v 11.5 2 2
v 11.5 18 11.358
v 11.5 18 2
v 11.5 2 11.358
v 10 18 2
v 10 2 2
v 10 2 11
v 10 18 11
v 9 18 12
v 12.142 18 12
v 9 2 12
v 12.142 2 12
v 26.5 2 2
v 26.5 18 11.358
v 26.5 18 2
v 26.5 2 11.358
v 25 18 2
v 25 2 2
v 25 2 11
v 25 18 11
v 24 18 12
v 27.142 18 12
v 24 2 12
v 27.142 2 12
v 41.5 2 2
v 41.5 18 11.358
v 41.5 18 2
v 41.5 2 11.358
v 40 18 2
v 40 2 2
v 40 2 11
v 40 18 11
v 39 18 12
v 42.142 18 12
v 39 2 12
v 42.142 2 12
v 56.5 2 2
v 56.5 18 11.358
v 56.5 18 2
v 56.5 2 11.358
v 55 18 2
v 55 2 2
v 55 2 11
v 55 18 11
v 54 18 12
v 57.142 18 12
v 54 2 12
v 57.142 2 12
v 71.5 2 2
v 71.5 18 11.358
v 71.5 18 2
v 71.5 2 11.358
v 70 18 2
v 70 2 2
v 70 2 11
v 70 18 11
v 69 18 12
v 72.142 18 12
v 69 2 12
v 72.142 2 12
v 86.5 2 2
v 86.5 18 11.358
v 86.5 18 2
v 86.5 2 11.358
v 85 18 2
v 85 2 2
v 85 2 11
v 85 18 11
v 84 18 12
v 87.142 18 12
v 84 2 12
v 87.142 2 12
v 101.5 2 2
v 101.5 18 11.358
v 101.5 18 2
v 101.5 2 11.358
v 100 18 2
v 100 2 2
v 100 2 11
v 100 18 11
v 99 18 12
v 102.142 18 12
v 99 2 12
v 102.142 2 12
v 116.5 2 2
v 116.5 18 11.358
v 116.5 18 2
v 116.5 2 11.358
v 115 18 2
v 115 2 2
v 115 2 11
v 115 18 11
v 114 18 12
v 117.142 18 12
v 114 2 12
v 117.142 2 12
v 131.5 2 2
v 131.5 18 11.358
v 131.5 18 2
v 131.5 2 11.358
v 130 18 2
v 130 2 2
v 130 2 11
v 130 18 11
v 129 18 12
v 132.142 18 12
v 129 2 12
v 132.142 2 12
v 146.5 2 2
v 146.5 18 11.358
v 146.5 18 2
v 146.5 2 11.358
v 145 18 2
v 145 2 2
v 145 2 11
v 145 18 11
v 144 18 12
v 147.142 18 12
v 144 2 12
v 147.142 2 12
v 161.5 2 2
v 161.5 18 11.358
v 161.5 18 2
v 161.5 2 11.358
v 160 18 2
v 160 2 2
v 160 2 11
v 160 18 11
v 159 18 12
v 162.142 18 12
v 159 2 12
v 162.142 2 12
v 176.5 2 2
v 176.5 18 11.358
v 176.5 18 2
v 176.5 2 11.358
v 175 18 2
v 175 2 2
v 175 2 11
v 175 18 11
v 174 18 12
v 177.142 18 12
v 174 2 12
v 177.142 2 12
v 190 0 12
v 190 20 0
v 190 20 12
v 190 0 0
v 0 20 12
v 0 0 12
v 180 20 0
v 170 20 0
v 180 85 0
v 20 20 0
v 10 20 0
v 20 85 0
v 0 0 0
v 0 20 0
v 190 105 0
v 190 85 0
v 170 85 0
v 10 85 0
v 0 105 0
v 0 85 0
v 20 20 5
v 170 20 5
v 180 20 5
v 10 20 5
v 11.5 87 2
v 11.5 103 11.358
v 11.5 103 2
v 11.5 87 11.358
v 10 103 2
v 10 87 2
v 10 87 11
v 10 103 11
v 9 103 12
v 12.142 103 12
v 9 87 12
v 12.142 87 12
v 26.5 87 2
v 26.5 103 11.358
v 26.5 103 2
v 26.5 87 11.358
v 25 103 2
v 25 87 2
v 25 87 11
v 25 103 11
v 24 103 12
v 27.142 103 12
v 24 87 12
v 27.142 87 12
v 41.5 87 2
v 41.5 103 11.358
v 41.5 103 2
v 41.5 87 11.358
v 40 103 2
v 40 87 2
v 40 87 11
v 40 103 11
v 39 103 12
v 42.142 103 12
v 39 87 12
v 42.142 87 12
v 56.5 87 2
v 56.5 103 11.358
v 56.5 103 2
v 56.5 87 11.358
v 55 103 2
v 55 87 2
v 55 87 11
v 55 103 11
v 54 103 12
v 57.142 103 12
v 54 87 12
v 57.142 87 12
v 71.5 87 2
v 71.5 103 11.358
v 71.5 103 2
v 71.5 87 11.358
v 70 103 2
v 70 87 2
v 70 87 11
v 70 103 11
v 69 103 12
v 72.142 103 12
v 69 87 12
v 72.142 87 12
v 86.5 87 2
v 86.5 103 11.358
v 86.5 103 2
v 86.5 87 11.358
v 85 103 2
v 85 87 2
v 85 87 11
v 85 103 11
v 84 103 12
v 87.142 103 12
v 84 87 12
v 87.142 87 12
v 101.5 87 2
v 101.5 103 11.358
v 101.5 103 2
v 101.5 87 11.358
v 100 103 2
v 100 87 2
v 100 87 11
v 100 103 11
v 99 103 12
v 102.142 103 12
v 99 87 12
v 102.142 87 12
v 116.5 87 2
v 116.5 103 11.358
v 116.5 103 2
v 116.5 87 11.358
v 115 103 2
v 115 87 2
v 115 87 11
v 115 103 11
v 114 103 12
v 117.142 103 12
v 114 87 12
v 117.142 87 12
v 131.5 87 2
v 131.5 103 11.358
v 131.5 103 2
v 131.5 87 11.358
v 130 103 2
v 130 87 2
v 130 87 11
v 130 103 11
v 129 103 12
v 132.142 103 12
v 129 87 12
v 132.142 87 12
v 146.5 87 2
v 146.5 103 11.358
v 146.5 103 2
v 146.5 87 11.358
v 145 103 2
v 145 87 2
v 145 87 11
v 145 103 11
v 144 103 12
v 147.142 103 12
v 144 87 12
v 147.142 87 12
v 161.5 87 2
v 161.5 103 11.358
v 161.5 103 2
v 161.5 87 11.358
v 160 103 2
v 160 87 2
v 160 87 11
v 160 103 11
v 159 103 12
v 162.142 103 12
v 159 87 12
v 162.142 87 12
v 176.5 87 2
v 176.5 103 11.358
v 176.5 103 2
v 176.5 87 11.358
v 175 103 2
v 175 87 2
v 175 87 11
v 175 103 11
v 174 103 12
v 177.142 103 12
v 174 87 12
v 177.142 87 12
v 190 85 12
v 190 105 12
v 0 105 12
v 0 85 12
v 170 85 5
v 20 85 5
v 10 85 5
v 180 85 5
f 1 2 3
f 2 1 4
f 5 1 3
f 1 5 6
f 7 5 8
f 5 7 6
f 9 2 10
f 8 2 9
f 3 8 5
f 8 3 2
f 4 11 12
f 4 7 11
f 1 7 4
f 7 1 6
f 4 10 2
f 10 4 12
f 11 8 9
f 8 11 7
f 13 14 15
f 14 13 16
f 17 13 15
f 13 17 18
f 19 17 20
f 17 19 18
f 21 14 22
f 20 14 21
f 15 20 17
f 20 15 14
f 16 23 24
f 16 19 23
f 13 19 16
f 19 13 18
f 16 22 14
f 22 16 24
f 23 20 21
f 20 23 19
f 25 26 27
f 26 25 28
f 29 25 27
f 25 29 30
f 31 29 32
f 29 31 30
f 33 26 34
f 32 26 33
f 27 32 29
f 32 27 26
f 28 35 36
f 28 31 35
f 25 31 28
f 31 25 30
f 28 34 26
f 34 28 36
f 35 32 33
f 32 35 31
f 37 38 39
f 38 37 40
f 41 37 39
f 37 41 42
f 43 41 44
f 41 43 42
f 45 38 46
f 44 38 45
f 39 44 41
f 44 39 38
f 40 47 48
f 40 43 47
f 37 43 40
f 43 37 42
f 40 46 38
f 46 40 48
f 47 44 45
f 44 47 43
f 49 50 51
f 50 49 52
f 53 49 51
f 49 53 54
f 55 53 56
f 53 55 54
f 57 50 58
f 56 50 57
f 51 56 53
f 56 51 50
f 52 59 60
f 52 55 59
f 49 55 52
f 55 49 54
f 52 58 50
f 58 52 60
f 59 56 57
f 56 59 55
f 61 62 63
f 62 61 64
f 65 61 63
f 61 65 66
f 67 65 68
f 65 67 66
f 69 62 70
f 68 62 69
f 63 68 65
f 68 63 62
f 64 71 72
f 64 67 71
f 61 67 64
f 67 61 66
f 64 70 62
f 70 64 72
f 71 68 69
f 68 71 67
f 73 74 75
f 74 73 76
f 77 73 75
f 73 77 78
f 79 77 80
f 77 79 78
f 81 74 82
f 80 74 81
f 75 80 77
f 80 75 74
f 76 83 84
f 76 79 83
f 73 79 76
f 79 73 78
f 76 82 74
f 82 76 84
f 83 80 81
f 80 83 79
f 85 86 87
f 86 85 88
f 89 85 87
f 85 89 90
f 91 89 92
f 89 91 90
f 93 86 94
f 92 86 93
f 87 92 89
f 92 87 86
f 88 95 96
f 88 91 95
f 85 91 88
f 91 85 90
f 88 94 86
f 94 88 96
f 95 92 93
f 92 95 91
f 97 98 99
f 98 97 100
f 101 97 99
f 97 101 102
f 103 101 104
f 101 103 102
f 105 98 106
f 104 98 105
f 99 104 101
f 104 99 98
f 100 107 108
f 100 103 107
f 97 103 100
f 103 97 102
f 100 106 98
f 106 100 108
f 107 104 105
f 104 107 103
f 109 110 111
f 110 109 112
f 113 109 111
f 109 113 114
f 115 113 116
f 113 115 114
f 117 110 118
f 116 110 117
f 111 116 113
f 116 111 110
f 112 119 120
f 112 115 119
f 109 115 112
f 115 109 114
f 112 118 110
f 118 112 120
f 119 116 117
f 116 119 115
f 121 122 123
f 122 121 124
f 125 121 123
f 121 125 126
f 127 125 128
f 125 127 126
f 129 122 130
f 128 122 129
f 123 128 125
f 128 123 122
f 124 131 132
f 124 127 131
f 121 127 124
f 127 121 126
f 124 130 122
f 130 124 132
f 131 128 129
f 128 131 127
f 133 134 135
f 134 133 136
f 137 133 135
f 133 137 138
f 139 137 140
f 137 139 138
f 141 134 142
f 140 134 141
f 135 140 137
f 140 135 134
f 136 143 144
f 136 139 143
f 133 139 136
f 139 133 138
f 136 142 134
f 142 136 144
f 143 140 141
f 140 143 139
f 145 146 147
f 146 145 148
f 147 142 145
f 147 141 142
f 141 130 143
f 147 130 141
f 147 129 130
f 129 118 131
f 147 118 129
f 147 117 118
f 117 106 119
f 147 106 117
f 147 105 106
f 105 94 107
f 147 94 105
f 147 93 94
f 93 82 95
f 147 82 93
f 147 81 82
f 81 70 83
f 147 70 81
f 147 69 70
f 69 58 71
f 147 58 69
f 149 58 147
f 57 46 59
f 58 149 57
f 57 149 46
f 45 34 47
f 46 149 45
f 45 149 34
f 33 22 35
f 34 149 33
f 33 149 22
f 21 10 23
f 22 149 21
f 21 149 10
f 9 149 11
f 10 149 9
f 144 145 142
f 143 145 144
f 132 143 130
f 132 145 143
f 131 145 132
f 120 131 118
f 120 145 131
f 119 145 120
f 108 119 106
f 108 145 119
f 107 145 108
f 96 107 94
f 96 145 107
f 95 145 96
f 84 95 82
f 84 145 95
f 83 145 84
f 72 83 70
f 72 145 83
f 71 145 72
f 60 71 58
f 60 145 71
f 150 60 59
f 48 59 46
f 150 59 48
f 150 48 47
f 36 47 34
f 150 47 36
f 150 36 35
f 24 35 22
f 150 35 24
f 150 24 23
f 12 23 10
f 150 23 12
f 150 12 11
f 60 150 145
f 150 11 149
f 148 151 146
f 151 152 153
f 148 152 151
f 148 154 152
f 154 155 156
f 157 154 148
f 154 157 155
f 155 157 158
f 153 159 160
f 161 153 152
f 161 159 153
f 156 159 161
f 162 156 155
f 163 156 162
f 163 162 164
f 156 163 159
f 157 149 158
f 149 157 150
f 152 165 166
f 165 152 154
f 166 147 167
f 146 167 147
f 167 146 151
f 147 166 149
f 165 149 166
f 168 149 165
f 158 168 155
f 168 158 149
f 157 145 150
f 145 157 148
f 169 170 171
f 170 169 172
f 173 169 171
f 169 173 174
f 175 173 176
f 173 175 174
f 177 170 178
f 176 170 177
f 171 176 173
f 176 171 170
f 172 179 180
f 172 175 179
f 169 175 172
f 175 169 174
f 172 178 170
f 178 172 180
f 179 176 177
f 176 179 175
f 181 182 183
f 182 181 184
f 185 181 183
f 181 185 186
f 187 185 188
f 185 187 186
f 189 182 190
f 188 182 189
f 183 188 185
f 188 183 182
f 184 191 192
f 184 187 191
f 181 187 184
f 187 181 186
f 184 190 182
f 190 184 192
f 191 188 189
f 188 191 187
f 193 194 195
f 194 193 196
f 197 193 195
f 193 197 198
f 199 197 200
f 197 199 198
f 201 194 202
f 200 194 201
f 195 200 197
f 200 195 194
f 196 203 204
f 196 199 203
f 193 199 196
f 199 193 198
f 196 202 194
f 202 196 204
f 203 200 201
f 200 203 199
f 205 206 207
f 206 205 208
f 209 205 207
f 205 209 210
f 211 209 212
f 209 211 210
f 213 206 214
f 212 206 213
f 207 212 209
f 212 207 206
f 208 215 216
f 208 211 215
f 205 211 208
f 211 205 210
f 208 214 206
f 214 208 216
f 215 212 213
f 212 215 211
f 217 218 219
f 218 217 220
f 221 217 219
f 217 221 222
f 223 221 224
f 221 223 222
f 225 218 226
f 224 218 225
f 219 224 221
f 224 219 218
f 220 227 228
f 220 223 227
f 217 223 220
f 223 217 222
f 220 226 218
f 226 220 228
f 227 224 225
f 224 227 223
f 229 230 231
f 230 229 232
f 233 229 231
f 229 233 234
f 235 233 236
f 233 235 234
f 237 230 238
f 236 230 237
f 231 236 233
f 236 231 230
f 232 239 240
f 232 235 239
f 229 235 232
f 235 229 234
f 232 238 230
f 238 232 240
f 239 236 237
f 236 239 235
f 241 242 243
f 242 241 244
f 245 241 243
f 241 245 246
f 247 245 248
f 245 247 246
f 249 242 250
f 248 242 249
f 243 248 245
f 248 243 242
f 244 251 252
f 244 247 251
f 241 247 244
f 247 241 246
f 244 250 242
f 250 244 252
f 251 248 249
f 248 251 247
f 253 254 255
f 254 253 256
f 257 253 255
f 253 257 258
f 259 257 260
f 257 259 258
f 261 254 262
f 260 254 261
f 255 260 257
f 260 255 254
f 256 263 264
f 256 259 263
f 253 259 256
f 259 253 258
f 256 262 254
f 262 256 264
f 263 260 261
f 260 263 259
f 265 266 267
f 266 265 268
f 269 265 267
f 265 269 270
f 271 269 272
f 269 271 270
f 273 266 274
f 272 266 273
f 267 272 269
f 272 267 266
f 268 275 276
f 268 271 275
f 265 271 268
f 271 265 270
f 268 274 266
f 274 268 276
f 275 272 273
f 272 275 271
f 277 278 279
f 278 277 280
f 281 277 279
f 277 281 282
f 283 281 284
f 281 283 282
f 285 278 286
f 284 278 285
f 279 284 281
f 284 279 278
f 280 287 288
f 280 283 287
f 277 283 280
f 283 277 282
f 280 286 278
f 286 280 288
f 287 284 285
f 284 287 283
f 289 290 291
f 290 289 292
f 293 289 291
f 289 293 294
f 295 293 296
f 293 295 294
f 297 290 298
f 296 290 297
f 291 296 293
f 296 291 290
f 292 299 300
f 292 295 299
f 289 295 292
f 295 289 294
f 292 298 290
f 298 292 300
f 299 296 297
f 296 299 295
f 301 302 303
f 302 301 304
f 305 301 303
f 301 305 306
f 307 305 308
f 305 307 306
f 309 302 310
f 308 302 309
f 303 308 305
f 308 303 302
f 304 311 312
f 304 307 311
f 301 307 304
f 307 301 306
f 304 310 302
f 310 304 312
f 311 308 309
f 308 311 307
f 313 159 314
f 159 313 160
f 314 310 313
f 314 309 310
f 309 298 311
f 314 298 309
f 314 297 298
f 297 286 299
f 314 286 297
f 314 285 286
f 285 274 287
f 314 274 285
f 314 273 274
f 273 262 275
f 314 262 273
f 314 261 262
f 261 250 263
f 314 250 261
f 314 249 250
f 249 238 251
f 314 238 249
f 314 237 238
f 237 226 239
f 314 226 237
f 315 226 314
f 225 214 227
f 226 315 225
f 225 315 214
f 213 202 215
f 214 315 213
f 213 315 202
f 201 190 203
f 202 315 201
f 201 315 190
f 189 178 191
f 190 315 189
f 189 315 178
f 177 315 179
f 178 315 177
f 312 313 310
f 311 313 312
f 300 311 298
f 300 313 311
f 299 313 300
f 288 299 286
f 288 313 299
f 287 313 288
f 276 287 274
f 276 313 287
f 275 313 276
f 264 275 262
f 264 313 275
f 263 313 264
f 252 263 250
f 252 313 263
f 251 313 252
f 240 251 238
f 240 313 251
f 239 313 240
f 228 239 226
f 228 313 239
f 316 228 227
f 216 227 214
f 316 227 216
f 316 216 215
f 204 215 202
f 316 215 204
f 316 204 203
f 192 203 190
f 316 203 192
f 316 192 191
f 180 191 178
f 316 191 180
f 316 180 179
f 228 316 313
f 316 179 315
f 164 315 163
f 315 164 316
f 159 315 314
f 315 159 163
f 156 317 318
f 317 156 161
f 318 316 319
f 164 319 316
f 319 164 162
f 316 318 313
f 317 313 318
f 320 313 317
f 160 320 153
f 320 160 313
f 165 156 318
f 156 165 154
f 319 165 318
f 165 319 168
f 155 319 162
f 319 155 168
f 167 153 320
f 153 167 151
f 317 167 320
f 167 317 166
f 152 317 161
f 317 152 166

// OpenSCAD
module bar () {
    difference() {
        cube([190,20,12]);
        translate([10,2,2])
            for (i=[0:11]) {
                translate([15*i,0,0]) cube([1.5,16,10]);
                translate([15*i-6.5,0,15.5]) rotate([0,45,0]) cube([10,16,10]);
            }
    }
}

translate([0,0,0]) bar();
translate([0,85,0]) bar();

translate([10,20,0]) cube([10,65,5]);
translate([170,20,0]) cube([10,65,5]);
